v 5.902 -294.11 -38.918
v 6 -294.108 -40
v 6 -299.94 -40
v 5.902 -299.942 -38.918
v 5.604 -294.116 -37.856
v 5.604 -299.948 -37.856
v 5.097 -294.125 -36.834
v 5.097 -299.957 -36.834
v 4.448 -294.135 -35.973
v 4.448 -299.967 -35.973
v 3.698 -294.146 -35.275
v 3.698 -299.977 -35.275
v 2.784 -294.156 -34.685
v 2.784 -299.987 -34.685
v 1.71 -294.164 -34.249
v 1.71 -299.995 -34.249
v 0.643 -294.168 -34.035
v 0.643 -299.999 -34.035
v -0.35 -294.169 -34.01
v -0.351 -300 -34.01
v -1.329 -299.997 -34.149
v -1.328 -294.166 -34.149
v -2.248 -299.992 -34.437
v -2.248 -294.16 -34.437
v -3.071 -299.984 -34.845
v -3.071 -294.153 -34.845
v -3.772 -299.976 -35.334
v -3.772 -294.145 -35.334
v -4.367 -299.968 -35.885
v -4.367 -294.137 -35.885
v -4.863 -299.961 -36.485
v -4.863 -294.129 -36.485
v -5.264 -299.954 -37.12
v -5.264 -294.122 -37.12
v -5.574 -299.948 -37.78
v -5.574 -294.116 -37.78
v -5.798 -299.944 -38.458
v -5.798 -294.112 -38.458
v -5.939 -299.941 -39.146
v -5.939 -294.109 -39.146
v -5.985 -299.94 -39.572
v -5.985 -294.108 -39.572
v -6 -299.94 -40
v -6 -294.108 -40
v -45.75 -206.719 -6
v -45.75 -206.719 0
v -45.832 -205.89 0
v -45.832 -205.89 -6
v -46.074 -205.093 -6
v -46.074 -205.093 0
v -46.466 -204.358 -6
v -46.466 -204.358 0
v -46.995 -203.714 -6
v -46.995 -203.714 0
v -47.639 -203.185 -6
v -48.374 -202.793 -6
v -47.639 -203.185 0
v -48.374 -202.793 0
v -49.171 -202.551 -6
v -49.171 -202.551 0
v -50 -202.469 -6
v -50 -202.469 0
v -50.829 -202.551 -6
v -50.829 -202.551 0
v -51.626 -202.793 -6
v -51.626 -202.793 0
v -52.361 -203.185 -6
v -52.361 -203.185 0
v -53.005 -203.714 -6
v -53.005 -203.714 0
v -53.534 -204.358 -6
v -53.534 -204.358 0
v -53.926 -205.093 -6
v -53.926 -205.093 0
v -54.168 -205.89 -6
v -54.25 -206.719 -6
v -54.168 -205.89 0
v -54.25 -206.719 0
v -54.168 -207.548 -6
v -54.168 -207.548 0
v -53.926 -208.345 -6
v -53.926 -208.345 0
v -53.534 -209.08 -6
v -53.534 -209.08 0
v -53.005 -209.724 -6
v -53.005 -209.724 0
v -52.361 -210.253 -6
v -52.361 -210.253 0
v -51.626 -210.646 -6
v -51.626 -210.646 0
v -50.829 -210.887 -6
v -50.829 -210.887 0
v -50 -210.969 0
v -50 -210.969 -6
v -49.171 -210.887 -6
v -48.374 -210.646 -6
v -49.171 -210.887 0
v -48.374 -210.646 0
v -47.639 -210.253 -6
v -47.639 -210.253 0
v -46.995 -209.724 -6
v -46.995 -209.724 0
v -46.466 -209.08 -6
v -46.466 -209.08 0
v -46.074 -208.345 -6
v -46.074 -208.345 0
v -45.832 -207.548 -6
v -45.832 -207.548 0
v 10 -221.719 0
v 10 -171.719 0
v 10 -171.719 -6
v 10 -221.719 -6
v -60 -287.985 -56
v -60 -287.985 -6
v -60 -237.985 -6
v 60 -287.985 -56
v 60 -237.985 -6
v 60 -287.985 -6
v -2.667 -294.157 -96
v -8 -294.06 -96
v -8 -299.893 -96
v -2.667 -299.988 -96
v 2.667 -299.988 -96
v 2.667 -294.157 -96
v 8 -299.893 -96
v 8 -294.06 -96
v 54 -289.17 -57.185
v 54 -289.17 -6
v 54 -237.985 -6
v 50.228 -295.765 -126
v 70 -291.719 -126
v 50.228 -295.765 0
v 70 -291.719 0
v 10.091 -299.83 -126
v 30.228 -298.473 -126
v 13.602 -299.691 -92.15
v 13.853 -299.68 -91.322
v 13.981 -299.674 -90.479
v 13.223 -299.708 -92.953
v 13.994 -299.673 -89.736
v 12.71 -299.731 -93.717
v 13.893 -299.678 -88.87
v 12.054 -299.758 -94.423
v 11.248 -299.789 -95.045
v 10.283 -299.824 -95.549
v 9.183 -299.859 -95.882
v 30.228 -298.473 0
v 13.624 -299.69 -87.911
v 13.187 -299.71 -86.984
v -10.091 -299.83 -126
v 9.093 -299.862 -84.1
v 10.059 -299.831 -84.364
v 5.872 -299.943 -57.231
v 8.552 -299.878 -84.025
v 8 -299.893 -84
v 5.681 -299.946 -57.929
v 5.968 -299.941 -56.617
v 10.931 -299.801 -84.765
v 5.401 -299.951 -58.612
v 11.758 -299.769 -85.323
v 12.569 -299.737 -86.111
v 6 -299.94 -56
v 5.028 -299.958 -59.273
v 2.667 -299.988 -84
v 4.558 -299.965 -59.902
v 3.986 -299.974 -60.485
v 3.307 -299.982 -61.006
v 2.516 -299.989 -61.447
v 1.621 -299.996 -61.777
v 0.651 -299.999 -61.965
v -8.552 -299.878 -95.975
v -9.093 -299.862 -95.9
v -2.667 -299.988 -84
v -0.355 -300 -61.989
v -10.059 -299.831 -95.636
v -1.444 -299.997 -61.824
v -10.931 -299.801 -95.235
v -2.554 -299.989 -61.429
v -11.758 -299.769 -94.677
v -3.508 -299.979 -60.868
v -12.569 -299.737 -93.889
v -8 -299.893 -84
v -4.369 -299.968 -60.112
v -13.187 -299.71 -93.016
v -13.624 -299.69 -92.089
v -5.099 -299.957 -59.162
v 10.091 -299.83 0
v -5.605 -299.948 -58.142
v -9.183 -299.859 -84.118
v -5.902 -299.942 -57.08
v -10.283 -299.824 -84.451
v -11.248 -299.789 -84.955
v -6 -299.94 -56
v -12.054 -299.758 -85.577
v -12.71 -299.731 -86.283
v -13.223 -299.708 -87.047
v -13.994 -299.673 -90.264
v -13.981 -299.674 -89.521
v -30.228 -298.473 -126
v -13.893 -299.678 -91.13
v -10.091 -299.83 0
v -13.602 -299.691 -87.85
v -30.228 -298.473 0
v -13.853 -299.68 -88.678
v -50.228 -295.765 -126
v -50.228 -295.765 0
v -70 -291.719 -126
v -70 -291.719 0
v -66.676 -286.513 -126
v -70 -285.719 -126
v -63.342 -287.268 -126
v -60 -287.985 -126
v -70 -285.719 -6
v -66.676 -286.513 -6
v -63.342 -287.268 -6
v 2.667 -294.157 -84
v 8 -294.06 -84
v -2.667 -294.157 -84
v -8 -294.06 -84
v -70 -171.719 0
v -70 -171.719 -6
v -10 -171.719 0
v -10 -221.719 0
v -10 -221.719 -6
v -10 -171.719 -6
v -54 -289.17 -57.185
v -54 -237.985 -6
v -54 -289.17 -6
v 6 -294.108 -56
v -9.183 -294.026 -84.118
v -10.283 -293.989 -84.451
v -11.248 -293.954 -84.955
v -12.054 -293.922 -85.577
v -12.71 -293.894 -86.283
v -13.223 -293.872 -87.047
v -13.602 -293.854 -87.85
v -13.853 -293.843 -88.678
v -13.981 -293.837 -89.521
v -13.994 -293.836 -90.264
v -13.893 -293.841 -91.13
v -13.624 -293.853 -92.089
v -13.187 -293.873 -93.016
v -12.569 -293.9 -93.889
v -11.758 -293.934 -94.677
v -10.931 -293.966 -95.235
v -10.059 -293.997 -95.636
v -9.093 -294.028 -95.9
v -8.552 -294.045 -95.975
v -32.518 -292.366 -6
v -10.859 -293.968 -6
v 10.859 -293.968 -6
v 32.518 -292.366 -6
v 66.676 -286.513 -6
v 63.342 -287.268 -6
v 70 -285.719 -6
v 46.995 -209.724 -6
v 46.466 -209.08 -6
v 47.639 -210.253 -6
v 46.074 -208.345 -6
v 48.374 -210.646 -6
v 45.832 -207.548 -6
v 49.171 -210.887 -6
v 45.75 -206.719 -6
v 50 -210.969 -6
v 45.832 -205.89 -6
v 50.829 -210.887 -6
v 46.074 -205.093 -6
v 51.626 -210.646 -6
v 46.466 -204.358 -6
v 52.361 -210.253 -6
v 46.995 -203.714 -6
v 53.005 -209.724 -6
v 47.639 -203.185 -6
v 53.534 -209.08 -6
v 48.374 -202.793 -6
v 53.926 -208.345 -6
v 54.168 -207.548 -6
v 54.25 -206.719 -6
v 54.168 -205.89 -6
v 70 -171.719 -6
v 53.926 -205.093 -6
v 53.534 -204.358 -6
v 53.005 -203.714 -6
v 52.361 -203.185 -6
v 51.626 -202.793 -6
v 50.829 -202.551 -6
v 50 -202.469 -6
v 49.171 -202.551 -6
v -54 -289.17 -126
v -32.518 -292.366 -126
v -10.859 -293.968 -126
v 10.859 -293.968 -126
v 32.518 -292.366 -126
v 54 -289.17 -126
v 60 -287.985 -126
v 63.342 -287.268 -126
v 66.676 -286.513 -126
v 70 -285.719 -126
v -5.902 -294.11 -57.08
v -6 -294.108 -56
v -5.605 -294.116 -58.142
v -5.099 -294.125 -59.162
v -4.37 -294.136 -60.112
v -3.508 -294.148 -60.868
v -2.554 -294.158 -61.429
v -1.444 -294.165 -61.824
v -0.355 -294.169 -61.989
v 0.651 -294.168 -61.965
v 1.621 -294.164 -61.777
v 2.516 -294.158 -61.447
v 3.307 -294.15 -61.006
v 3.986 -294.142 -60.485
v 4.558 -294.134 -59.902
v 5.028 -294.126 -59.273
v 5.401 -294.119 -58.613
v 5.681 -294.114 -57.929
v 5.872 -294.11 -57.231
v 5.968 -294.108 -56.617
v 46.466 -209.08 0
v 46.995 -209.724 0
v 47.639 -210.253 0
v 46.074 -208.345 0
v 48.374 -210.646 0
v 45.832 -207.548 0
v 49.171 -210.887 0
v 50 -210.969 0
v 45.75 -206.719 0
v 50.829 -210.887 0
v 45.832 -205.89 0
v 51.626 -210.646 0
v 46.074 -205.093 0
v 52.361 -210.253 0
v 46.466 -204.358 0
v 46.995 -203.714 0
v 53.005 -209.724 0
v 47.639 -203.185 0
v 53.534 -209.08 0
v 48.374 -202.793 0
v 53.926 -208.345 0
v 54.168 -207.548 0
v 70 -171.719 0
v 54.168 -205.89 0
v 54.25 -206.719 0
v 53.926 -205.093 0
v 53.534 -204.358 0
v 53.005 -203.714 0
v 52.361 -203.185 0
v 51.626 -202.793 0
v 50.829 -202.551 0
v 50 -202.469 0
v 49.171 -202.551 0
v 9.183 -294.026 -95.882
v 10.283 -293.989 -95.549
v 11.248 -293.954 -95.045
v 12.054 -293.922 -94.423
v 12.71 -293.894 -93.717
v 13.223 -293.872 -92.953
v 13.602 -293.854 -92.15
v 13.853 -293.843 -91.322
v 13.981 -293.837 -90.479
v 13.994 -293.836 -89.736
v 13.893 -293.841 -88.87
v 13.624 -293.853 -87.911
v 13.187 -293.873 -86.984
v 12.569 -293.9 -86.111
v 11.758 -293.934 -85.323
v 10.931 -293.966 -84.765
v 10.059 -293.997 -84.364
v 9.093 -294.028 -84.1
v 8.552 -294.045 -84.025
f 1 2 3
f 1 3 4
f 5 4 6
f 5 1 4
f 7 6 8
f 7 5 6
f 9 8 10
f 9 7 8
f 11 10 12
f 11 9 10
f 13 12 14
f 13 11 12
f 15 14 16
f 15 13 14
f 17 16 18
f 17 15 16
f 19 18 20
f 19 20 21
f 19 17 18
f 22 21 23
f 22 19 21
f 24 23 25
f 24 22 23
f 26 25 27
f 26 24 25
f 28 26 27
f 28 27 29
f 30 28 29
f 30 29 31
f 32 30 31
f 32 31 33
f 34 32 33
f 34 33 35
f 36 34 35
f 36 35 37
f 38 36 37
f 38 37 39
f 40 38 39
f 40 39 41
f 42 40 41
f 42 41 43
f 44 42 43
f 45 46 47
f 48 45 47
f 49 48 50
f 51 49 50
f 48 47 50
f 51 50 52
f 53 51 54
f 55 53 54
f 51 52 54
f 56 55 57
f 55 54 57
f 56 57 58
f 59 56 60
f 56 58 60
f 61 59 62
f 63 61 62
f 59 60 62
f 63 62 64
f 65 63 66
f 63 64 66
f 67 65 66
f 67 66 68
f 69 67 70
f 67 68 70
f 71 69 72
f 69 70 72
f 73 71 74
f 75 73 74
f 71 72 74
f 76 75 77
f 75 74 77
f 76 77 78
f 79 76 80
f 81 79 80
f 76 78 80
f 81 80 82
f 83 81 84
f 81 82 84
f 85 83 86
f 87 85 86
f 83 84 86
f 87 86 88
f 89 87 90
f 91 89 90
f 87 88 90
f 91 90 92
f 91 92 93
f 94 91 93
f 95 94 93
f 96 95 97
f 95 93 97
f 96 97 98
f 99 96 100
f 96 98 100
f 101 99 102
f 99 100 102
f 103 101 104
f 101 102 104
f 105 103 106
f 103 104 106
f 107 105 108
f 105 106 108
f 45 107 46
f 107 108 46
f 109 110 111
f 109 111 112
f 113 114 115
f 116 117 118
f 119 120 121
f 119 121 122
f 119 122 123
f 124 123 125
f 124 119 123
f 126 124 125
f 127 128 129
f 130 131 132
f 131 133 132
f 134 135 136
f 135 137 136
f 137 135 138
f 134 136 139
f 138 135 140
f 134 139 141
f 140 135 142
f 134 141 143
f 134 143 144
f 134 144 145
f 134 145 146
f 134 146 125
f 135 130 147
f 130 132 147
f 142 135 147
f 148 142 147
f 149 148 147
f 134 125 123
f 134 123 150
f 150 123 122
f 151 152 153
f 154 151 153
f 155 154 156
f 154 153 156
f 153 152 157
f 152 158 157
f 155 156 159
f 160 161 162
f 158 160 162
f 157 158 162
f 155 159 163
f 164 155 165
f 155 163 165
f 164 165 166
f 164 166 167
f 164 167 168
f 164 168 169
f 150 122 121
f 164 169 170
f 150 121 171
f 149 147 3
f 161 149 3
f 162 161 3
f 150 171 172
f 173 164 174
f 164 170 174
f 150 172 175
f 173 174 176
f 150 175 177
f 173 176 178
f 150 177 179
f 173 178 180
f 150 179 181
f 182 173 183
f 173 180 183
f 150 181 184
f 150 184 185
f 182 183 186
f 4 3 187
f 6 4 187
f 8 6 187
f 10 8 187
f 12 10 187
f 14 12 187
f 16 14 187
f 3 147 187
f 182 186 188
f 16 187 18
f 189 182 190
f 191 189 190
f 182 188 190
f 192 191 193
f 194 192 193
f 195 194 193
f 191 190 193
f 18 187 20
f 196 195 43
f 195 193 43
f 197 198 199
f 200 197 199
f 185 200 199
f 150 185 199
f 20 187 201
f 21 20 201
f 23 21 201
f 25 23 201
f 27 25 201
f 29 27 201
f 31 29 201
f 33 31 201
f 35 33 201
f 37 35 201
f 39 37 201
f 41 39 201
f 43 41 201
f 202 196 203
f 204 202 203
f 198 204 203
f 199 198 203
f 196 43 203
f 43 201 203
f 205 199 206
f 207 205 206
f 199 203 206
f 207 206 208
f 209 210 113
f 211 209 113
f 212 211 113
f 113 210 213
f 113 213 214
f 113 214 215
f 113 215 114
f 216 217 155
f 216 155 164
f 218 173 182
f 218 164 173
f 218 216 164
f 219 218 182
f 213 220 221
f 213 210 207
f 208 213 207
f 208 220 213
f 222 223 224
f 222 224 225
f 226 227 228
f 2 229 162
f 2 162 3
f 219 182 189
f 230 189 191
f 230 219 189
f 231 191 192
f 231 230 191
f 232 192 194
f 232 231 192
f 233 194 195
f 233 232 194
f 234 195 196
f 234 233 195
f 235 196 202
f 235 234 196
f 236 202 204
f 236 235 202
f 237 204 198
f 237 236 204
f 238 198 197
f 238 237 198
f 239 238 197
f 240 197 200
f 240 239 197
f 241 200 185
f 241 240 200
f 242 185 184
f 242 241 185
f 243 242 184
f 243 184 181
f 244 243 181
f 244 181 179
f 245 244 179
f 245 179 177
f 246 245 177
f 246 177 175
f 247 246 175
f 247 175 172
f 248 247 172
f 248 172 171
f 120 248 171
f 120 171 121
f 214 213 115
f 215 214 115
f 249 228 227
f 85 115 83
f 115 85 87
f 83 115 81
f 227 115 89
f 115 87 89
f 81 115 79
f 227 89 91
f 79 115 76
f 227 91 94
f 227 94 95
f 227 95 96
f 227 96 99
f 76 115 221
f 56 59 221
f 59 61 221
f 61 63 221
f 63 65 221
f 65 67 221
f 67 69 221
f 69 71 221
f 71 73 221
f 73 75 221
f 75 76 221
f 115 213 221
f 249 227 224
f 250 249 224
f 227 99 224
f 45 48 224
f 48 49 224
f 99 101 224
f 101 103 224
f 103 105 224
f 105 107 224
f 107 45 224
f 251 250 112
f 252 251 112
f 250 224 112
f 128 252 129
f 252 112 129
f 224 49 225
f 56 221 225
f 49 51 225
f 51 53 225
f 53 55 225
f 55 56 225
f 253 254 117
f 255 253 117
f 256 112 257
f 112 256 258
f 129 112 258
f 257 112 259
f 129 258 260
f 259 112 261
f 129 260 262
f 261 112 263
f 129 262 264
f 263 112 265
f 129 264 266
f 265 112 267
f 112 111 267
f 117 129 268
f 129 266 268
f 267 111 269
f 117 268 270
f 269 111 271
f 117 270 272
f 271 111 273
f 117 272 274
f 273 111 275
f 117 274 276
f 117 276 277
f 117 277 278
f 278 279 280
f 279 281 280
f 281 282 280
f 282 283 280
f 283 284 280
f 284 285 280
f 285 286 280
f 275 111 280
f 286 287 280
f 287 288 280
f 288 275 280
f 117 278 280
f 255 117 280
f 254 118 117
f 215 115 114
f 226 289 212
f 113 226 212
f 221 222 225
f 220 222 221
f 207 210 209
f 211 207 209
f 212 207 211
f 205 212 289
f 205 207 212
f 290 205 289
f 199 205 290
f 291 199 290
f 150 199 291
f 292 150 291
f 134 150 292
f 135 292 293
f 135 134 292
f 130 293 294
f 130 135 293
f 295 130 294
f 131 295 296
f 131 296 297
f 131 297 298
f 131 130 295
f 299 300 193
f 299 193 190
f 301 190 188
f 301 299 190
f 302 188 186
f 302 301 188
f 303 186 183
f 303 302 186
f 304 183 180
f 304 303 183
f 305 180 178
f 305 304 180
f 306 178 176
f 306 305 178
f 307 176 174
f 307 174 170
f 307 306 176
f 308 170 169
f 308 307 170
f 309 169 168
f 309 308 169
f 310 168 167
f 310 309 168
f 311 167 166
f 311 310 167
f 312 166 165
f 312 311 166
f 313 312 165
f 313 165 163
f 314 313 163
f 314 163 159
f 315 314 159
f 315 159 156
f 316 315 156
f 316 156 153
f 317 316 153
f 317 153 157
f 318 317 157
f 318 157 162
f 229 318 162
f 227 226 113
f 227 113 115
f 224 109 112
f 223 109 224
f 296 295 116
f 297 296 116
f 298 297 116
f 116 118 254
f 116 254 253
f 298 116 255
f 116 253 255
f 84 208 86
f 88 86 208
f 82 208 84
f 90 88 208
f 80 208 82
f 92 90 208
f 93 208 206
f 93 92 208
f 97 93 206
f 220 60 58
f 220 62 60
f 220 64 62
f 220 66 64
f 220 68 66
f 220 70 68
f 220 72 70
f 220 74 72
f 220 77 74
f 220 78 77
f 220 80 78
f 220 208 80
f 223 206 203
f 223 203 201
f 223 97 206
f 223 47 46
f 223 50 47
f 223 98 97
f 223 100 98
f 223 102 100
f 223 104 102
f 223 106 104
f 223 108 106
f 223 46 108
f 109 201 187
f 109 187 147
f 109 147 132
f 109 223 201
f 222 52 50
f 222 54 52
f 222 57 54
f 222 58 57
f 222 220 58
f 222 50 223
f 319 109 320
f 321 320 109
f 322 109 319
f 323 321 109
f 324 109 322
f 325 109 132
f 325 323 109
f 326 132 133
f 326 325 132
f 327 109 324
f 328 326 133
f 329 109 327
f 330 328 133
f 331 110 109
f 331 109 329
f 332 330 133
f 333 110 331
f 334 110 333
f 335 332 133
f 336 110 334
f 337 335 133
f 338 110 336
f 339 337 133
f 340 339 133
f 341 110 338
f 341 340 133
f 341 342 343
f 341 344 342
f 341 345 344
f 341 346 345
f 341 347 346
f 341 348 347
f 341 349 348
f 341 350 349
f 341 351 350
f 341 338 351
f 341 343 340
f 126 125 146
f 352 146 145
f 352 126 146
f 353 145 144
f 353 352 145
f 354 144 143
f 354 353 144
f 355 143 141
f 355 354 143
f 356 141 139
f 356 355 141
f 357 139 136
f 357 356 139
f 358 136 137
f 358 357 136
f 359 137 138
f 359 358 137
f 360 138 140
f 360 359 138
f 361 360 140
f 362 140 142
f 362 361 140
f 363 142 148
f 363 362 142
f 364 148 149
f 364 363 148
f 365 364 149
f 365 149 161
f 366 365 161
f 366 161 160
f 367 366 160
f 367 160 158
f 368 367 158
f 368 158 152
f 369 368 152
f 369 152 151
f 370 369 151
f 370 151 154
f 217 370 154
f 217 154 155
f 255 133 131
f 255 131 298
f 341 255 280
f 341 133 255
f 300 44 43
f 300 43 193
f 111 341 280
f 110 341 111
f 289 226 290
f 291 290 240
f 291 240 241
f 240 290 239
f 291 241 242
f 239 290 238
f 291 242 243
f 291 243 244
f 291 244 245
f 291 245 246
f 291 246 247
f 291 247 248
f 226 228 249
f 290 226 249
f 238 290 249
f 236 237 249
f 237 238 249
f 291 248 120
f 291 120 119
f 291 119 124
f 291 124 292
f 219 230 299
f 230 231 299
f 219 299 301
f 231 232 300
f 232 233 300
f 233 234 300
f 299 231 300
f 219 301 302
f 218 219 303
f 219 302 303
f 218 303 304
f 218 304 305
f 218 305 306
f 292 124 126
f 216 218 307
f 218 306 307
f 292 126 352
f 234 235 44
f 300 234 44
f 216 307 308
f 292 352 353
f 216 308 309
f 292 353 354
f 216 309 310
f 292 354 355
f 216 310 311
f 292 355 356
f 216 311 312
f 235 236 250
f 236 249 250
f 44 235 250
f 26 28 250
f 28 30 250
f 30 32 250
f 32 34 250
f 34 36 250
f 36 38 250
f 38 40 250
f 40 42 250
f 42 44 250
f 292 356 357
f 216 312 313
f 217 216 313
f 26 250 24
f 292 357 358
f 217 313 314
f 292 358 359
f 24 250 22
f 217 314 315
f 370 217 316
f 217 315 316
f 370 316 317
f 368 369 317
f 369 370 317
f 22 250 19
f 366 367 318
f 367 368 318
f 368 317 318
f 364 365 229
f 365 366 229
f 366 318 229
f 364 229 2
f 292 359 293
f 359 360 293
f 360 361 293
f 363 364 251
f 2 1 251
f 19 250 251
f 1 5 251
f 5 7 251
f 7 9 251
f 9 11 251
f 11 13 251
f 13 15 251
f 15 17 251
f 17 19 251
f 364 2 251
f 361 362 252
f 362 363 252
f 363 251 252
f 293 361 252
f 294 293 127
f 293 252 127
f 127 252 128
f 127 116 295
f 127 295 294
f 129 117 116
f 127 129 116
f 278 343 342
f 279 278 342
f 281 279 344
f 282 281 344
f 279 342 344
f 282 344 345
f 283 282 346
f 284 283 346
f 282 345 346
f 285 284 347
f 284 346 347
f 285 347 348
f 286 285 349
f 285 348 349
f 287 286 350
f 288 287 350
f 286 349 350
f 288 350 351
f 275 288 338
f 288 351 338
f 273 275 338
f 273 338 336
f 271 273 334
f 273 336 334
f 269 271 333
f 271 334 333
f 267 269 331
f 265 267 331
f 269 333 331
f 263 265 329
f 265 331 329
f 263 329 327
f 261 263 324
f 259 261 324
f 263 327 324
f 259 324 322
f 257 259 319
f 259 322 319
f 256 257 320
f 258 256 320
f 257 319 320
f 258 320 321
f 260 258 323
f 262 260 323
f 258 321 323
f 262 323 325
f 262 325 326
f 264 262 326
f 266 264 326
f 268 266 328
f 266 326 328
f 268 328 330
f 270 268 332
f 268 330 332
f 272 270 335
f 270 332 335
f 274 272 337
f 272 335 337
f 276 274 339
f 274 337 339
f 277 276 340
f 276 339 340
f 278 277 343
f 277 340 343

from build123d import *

# Parameters (mm, degrees)
F0_R     = 4.25
F1_DEPTH = 6
F3_DEPTH = 120
F5_DEPTH = 120
F7_REACH = 132.1169232427
F9_DEPTH = 300.001


with BuildPart() as f1:
    # F0 (on Top) → F1 (new body)
    with BuildSketch(Plane.XY):
        with BuildLine():
            Line((-70, -171.7190429163), (-70, -291.7190429163))
            ThreePointArc((-70, -291.7190429163), (0, -300), (70, -291.7190429163))
            Line((70, -291.7190429163), (70, -171.7190429163))
            Line((70, -171.7190429163), (10, -171.7190429163))
            Line((10, -171.7190429163), (10, -221.7190429163))
            Line((10, -221.7190429163), (0, -221.7190429163))
            Line((0, -221.7190429163), (-10, -221.7190429163))
            Line((-10, -221.7190429163), (-10, -171.7190429163))
            Line((-10, -171.7190429163), (-70, -171.7190429163))
        make_face()
        with Locations((-50, -206.7190429163)):
            Circle(F0_R, mode=Mode.SUBTRACT)
        with Locations((50, -206.7190429163)):
            Circle(F0_R, mode=Mode.SUBTRACT)
    extrude(amount=-F1_DEPTH)

    # F2 (on face) → F3 (join)
    with BuildSketch(Plane(origin=(0, 0, -6), x_dir=(1, 0, 0), z_dir=(0, 0, -1))):
        with BuildLine():
            Line((-54, 237.9850195496), (-54, 289.1701427966))
            ThreePointArc((-54, 289.1701427966), (-57.0030799982, 288.5931744788), (-60, 287.9850195496))
            Line((-60, 287.9850195496), (-60, 237.9850195496))
            Line((-60, 237.9850195496), (-54, 237.9850195496))
        make_face()
        with BuildLine():
            ThreePointArc((60, 287.9850195496), (65.0098735772, 286.8956043973), (70, 285.7190429163))
            Line((70, 285.7190429163), (70, 291.7190429163))
            ThreePointArc((70, 291.7190429163), (0, 300), (-70, 291.7190429163))
            Line((-70, 291.7190429163), (-70, 285.7190429163))
            ThreePointArc((-70, 285.7190429163), (-65.0098735772, 286.8956043973), (-60, 287.9850195496))
            ThreePointArc((-60, 287.9850195496), (-57.0030799982, 288.5931744788), (-54, 289.1701427966))
            ThreePointArc((-54, 289.1701427966), (0, 294.1689505794), (54, 289.1701427966))
            ThreePointArc((54, 289.1701427966), (57.0030799982, 288.5931744788), (60, 287.9850195496))
        make_face()
        with BuildLine():
            Line((60, 237.9850195496), (60, 287.9850195496))
            ThreePointArc((60, 287.9850195496), (57.0030799982, 288.5931744788), (54, 289.1701427966))
            Line((54, 289.1701427966), (54, 237.9850195496))
            Line((54, 237.9850195496), (60, 237.9850195496))
        make_face()
    extrude(amount=F3_DEPTH)

    # F4 (on face) → F5 (cut, through all)
    with BuildSketch(Plane.YZ.offset(60)):
        Polygon((-237.9850195496, -126), (-237.9850195496, -6), (-287.9850195496, -56), (-287.9850195496, -126), align=None)
    extrude(amount=-F5_DEPTH, mode=Mode.SUBTRACT)

    f7_end = Plane(origin=(57, -262.9850195496, -31), x_dir=(0, 0.7071067812, 0.7071067812), z_dir=(0, 0.7071067812, -0.7071067812))
    # F6 (on face) → F7 (cut, up to a plane its end follows)
    with BuildSketch(Plane(origin=(0, 0, -126), x_dir=(1, 0, 0), z_dir=(0, 0, -1))):
        Polygon((-54, 287.9850195496), (-54, 289.1701427966), (-60, 287.9850195496), align=None)
        Polygon((60, 287.9850195496), (54, 289.1701427966), (54, 287.9850195496), align=None)
    f7_long = extrude(amount=-F7_REACH, mode=Mode.PRIVATE)
    add(split(f7_long, bisect_by=f7_end, keep=Keep.TOP, mode=Mode.PRIVATE), mode=Mode.SUBTRACT)

    # F8 (on Front) → F9 (cut, through all)
    with BuildSketch(Plane.XZ):
        with BuildLine():
            Line((8, -84), (0, -84))
            Line((0, -84), (-8, -84))
            ThreePointArc((-8, -84), (-14, -90), (-8, -96))
            Line((-8, -96), (0, -96))
            Line((0, -96), (8, -96))
            ThreePointArc((8, -96), (14, -90), (8, -84))
        make_face()
        with BuildLine():
            Line((6, -48), (6, -40))
            ThreePointArc((6, -40), (0, -34), (-6, -40))
            Line((-6, -40), (-6, -48))
            Line((-6, -48), (-6, -56))
            ThreePointArc((-6, -56), (0, -62), (6, -56))
            Line((6, -56), (6, -48))
        make_face()
    extrude(amount=F9_DEPTH, mode=Mode.SUBTRACT)


solid = f1.part
